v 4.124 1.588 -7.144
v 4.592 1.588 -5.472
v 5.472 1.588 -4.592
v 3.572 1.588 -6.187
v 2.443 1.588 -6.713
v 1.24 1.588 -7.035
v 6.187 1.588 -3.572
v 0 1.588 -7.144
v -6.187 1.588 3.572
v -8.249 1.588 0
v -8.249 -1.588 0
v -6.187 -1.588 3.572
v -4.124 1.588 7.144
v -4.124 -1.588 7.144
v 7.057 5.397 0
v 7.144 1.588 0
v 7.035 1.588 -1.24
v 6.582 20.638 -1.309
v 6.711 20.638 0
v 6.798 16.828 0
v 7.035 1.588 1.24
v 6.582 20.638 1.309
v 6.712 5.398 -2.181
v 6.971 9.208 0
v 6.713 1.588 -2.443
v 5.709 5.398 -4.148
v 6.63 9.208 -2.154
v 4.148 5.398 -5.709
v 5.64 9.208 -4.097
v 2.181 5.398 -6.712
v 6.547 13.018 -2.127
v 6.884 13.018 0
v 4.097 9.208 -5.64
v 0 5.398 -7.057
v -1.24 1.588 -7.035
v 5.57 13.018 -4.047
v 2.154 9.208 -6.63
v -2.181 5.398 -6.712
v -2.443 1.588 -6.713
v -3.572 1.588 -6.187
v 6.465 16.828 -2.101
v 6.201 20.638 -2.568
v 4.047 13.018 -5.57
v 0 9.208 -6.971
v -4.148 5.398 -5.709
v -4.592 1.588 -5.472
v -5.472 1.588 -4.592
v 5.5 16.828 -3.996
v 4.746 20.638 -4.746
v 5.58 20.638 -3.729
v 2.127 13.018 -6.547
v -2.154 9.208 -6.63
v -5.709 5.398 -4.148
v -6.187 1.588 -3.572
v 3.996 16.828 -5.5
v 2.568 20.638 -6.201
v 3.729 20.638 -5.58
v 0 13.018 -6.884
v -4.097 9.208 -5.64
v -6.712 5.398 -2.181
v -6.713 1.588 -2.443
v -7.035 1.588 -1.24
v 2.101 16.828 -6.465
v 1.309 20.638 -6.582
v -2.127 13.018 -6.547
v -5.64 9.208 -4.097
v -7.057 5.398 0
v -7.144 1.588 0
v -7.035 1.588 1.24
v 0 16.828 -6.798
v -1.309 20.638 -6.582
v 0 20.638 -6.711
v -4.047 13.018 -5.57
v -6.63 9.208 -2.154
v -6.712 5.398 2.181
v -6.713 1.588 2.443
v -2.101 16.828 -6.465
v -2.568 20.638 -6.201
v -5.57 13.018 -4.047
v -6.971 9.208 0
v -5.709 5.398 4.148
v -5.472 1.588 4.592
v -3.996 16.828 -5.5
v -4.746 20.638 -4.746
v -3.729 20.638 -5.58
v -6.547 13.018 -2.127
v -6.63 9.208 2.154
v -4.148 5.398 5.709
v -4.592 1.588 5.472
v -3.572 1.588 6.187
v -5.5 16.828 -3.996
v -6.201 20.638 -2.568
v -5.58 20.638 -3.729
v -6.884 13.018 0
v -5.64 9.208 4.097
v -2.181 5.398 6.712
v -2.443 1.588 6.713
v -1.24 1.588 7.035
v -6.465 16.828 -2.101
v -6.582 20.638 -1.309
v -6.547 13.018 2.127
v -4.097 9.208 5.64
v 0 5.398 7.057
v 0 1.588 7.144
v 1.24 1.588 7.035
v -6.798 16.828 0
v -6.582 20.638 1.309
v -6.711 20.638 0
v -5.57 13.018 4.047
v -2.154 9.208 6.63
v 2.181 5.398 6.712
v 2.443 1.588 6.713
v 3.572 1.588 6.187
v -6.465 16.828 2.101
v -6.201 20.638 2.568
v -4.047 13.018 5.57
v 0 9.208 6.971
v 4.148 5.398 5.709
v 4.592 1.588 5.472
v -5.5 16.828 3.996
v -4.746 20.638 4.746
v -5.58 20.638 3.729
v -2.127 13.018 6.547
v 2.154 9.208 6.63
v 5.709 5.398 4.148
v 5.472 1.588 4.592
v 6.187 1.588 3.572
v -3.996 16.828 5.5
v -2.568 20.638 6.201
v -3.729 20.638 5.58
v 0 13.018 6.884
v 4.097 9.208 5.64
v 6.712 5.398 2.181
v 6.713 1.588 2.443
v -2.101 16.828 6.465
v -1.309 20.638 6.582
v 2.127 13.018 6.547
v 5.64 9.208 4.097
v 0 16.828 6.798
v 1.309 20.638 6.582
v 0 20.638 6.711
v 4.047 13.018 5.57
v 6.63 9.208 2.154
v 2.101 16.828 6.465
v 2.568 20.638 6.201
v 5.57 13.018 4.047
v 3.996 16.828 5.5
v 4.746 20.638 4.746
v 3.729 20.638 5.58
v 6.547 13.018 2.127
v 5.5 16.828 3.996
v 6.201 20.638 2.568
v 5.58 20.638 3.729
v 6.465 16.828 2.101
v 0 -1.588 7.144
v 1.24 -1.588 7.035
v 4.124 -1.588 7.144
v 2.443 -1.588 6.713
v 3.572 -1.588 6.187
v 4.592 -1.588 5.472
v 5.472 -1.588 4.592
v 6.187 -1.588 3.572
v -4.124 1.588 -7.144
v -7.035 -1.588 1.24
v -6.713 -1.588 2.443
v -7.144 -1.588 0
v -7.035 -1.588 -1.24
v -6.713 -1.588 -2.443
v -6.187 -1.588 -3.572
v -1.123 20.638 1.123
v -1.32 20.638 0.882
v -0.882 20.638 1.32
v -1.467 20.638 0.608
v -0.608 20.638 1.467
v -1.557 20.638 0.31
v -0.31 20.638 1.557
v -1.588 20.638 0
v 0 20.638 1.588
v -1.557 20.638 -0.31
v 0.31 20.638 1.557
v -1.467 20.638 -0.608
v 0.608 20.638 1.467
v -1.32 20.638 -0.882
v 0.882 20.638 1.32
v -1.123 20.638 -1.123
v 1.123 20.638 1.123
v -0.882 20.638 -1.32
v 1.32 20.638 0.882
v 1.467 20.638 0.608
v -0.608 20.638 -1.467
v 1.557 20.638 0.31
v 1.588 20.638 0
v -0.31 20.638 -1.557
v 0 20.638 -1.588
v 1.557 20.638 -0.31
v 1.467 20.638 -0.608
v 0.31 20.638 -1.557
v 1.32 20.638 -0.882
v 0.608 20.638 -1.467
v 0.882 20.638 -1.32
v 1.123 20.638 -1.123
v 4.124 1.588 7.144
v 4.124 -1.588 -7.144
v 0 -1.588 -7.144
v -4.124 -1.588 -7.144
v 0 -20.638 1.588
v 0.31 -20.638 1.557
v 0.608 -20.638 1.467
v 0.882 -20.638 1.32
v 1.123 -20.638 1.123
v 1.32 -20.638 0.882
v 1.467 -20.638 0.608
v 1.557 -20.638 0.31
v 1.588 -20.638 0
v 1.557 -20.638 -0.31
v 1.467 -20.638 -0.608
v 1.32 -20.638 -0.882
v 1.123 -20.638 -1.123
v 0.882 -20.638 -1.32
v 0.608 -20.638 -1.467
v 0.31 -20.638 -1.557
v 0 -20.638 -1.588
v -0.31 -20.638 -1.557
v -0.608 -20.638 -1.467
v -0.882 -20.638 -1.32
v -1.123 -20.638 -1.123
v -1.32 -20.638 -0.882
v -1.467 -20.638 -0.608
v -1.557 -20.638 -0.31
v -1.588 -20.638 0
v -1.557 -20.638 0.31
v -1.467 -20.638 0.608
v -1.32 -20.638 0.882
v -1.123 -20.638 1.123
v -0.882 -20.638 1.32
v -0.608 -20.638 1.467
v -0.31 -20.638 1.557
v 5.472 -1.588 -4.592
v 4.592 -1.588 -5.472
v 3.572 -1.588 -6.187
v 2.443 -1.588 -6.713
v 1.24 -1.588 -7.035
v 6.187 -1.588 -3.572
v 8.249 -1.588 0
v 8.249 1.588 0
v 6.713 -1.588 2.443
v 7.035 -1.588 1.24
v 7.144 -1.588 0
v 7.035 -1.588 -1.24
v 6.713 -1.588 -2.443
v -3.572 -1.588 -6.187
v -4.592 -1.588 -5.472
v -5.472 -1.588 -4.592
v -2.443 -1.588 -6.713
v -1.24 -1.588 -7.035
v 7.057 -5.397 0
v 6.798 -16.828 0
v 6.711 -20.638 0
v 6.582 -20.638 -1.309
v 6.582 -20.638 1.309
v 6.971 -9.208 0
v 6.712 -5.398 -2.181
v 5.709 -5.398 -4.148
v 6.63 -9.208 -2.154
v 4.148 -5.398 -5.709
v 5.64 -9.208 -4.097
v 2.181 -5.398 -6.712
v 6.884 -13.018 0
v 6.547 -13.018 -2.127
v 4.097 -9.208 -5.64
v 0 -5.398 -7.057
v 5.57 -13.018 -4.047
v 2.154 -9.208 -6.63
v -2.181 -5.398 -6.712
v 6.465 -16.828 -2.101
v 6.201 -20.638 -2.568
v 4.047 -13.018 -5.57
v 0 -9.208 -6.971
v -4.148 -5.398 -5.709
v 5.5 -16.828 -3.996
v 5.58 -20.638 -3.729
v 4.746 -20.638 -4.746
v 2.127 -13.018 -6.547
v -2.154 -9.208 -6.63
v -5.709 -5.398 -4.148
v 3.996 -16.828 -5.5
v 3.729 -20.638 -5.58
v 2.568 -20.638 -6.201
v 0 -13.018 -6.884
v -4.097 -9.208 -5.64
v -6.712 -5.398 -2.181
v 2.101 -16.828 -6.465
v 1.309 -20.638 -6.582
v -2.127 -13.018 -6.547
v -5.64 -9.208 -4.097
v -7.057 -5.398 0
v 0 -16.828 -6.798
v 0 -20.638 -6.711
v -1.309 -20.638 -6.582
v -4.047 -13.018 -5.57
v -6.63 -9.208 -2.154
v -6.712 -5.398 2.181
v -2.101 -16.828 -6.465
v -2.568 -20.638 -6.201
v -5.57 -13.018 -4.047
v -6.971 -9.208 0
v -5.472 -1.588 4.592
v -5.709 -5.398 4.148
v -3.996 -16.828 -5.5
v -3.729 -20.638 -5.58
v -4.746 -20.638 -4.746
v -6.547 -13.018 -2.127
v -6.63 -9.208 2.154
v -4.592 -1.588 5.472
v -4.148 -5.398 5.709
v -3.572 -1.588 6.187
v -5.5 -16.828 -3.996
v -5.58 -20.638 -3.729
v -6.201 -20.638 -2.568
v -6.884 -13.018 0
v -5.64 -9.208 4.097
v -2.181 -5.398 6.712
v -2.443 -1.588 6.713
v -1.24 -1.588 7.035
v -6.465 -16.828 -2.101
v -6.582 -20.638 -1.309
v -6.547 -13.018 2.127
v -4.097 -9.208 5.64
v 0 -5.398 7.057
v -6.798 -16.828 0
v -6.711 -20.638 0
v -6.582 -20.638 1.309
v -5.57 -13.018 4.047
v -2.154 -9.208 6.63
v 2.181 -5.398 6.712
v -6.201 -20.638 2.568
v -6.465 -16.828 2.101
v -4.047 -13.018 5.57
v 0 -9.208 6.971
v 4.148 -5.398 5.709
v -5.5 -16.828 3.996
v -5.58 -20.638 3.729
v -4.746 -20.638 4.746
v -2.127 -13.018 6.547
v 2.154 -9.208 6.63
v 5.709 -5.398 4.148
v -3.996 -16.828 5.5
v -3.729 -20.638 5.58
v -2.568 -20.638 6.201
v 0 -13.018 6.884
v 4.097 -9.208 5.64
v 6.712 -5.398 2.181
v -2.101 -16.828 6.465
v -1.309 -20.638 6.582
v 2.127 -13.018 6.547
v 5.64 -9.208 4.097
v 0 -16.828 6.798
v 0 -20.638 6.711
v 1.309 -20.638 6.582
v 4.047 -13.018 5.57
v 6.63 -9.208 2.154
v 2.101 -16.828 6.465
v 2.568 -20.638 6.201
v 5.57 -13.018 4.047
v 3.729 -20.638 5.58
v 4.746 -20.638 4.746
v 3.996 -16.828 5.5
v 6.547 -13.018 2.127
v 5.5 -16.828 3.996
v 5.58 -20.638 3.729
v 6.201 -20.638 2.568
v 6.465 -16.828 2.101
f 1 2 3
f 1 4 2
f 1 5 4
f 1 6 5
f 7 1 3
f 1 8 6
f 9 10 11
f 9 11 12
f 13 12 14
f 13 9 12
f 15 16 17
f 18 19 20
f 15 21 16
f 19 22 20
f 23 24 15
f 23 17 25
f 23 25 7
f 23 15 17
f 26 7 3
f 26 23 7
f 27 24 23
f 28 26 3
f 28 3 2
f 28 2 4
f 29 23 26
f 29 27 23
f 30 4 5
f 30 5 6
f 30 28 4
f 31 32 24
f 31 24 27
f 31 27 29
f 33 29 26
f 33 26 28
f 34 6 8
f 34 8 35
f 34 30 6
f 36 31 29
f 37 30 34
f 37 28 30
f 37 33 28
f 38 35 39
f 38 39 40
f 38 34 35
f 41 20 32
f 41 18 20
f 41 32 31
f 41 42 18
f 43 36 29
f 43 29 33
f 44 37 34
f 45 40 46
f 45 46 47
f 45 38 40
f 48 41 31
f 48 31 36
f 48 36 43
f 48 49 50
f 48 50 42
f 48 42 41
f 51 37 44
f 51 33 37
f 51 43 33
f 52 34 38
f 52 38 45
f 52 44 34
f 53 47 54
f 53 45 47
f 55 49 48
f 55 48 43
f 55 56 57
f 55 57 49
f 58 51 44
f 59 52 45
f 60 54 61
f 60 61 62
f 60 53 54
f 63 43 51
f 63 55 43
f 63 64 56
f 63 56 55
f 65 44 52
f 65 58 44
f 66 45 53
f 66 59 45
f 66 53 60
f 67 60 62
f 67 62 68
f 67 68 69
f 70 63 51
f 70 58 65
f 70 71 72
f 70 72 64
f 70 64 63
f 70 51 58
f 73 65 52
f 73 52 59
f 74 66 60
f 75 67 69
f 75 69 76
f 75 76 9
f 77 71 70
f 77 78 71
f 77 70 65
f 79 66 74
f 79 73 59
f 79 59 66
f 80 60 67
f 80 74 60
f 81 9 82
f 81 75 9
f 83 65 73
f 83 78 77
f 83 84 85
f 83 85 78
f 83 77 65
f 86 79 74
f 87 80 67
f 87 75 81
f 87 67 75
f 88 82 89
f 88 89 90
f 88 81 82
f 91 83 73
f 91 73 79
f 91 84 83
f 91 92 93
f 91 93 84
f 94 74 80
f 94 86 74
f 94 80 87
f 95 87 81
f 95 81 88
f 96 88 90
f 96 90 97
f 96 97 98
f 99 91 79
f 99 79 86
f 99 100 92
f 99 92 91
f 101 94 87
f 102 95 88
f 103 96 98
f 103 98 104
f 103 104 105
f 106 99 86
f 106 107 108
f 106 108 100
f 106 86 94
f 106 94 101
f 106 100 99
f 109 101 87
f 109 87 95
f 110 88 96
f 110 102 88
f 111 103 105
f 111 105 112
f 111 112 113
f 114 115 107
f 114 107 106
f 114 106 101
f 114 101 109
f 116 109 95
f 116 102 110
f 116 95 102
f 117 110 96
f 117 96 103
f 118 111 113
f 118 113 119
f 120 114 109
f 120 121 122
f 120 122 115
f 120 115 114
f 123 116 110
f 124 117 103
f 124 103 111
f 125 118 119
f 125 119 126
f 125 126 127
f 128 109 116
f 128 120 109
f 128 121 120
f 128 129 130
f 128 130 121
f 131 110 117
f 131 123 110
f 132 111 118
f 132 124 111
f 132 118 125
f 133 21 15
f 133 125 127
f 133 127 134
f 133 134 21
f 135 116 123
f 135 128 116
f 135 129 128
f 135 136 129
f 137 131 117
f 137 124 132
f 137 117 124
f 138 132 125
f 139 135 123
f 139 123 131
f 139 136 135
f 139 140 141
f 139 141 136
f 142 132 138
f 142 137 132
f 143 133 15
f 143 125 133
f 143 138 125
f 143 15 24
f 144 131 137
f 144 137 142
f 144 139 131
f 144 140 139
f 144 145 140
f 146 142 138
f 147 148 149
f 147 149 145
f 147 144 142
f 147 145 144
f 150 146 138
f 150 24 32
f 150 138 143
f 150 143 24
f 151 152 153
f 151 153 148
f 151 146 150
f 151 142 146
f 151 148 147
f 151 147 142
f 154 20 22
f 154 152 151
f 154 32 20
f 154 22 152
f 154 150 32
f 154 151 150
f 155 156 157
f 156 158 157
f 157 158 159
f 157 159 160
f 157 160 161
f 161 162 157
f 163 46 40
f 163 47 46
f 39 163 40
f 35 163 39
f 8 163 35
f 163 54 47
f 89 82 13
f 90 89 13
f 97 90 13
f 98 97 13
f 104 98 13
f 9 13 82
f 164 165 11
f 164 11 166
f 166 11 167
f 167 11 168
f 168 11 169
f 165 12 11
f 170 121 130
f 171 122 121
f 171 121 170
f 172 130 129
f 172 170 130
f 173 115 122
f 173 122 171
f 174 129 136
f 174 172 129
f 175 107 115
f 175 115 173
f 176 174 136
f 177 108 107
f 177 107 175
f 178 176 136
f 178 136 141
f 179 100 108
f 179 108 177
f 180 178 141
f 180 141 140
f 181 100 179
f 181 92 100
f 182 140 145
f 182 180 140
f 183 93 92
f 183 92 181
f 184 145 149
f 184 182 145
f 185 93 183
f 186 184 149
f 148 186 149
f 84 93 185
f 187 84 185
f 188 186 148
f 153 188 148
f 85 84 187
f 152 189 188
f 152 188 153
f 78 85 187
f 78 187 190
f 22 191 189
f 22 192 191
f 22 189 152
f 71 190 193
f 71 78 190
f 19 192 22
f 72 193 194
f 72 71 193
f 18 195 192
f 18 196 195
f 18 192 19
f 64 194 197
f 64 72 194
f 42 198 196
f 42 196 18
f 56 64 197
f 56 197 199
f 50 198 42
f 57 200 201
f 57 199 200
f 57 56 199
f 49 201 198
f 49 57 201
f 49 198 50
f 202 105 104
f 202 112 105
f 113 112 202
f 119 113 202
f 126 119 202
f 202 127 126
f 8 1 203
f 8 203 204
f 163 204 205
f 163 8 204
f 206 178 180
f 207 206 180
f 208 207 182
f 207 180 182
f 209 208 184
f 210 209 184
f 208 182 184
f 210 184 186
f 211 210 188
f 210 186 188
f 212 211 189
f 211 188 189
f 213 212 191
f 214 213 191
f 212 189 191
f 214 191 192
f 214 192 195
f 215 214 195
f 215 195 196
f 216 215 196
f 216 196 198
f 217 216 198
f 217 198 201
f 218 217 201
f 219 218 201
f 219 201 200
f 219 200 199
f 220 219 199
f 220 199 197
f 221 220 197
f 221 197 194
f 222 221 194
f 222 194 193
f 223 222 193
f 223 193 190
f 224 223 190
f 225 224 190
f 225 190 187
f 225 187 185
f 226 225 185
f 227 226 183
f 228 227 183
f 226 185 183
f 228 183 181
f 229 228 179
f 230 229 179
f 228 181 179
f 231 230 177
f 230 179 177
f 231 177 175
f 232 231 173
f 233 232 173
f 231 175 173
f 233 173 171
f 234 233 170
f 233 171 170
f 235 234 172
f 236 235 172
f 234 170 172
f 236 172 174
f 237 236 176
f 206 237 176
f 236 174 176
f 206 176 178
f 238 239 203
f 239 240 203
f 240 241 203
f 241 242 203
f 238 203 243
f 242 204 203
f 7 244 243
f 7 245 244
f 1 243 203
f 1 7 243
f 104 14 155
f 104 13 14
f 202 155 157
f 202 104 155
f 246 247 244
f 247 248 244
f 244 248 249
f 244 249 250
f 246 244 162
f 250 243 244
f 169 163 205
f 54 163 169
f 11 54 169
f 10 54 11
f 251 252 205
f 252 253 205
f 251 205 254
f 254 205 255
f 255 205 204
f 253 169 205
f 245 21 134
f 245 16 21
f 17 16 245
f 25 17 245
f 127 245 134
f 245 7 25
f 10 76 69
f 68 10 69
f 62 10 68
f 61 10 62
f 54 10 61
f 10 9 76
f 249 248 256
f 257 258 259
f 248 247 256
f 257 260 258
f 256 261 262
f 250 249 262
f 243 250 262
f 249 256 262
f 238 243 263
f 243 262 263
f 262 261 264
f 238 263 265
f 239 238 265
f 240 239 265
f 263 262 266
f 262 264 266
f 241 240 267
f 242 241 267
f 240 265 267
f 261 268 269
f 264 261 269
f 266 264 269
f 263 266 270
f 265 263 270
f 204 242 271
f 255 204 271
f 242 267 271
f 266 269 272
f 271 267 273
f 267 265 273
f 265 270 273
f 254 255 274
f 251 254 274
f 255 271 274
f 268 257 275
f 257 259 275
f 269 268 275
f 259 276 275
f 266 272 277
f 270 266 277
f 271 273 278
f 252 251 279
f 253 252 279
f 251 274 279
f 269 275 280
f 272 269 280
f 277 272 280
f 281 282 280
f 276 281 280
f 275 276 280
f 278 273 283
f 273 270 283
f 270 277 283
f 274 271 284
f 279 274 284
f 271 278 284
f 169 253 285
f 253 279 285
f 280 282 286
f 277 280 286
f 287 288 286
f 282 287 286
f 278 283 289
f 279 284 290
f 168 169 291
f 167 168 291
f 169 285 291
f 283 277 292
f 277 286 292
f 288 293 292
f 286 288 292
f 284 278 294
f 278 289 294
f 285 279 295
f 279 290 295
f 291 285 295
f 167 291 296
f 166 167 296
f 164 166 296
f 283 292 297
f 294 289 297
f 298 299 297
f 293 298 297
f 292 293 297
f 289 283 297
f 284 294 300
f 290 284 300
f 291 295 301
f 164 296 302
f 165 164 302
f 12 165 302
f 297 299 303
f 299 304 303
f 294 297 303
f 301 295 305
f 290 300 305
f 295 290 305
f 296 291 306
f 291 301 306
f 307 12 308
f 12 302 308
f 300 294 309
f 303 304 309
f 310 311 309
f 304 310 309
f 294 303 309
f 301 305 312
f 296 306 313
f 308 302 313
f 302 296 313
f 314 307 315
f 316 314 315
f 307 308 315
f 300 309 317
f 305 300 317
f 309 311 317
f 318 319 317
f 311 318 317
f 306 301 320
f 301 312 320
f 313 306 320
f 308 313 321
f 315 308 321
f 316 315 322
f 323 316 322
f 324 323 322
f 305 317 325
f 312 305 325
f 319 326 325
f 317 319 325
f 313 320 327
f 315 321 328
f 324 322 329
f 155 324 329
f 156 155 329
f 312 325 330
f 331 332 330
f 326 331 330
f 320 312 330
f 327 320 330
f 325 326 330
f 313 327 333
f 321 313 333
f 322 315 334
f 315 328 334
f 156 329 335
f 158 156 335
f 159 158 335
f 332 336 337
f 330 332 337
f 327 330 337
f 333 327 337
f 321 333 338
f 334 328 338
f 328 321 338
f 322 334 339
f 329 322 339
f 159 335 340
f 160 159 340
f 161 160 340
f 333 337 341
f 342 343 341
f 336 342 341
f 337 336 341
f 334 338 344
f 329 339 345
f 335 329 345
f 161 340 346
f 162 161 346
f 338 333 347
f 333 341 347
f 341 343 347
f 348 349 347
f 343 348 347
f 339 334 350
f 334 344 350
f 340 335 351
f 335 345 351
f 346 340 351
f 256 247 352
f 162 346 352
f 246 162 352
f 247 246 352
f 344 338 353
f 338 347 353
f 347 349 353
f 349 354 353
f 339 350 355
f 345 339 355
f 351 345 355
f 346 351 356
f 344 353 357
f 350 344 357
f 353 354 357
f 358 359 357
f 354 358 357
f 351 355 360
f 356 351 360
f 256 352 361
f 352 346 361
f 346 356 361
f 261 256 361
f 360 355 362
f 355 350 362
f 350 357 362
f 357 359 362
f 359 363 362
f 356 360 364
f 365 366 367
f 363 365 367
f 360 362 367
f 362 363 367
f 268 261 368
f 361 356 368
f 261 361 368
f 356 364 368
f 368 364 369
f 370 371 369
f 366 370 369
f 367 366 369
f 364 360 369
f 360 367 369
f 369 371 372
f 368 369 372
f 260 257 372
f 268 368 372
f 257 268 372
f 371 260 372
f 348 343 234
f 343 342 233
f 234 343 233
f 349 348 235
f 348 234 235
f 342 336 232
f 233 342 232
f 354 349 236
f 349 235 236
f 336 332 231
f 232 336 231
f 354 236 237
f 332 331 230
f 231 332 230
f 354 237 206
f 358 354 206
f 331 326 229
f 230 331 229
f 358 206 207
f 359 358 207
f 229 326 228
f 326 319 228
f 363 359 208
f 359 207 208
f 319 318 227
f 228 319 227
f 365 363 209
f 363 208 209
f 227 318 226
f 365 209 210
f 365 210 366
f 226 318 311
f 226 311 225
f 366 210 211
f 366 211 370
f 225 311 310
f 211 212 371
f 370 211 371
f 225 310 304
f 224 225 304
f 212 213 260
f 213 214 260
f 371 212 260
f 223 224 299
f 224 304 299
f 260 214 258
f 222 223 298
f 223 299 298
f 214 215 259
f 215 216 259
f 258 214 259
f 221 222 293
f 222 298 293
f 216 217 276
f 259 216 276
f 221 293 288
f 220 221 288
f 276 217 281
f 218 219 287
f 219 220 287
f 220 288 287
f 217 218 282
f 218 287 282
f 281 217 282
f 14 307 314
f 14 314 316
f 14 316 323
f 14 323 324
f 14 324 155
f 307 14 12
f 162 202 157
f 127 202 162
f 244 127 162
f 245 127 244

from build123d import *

# Parameters (mm, degrees)
BOSS_EXTRUDE3_DEPTH = 1.5875
SKETCH4_R           = 7.14375
BOSS_EXTRUDE4_DEPTH = 19.05
BOSS_EXTRUDE4_TAPER = 1.3
SKETCH5_R           = 1.5875
CUT_EXTRUDE1_DEPTH  = 43.693126115


with BuildPart() as part:
    # Sketch3 → Boss-Extrude3 (new body)
    with BuildSketch(Plane(origin=(0, 0, 0), x_dir=(1, 0, 0), z_dir=(0, 1, 0))):
        Polygon((8.248891971, 0), (4.124445986, 7.14375), (-4.124445986, 7.14375), (-8.248891971, 0), (-4.124445986, -7.14375), (4.124445986, -7.14375), align=None)
    boss_extrude3 = extrude(amount=BOSS_EXTRUDE3_DEPTH)

    # Sketch4 → Boss-Extrude4 (add)
    with BuildSketch(Plane(origin=(0, 1.5875, 0), x_dir=(1, 0, 0), z_dir=(0, 1, 0))):
        Circle(SKETCH4_R)
    boss_extrude4 = extrude(amount=BOSS_EXTRUDE4_DEPTH, taper=BOSS_EXTRUDE4_TAPER)

    # Mirror1: Boss-Extrude3, Boss-Extrude4 across plane
    add(boss_extrude3.mirror(Plane.ZX))
    add(boss_extrude4.mirror(Plane.ZX))

    # Sketch5 → Cut-Extrude1 (cut, through all)
    with BuildSketch(Plane(origin=(0, 20.6375, 0), x_dir=(1, 0, 0), z_dir=(0, 1, 0))):
        with Locations(Location((0, 0, 0), (0, 0, 270))):
            Circle(SKETCH5_R)
    extrude(amount=-CUT_EXTRUDE1_DEPTH, mode=Mode.SUBTRACT)


solid = part.part
